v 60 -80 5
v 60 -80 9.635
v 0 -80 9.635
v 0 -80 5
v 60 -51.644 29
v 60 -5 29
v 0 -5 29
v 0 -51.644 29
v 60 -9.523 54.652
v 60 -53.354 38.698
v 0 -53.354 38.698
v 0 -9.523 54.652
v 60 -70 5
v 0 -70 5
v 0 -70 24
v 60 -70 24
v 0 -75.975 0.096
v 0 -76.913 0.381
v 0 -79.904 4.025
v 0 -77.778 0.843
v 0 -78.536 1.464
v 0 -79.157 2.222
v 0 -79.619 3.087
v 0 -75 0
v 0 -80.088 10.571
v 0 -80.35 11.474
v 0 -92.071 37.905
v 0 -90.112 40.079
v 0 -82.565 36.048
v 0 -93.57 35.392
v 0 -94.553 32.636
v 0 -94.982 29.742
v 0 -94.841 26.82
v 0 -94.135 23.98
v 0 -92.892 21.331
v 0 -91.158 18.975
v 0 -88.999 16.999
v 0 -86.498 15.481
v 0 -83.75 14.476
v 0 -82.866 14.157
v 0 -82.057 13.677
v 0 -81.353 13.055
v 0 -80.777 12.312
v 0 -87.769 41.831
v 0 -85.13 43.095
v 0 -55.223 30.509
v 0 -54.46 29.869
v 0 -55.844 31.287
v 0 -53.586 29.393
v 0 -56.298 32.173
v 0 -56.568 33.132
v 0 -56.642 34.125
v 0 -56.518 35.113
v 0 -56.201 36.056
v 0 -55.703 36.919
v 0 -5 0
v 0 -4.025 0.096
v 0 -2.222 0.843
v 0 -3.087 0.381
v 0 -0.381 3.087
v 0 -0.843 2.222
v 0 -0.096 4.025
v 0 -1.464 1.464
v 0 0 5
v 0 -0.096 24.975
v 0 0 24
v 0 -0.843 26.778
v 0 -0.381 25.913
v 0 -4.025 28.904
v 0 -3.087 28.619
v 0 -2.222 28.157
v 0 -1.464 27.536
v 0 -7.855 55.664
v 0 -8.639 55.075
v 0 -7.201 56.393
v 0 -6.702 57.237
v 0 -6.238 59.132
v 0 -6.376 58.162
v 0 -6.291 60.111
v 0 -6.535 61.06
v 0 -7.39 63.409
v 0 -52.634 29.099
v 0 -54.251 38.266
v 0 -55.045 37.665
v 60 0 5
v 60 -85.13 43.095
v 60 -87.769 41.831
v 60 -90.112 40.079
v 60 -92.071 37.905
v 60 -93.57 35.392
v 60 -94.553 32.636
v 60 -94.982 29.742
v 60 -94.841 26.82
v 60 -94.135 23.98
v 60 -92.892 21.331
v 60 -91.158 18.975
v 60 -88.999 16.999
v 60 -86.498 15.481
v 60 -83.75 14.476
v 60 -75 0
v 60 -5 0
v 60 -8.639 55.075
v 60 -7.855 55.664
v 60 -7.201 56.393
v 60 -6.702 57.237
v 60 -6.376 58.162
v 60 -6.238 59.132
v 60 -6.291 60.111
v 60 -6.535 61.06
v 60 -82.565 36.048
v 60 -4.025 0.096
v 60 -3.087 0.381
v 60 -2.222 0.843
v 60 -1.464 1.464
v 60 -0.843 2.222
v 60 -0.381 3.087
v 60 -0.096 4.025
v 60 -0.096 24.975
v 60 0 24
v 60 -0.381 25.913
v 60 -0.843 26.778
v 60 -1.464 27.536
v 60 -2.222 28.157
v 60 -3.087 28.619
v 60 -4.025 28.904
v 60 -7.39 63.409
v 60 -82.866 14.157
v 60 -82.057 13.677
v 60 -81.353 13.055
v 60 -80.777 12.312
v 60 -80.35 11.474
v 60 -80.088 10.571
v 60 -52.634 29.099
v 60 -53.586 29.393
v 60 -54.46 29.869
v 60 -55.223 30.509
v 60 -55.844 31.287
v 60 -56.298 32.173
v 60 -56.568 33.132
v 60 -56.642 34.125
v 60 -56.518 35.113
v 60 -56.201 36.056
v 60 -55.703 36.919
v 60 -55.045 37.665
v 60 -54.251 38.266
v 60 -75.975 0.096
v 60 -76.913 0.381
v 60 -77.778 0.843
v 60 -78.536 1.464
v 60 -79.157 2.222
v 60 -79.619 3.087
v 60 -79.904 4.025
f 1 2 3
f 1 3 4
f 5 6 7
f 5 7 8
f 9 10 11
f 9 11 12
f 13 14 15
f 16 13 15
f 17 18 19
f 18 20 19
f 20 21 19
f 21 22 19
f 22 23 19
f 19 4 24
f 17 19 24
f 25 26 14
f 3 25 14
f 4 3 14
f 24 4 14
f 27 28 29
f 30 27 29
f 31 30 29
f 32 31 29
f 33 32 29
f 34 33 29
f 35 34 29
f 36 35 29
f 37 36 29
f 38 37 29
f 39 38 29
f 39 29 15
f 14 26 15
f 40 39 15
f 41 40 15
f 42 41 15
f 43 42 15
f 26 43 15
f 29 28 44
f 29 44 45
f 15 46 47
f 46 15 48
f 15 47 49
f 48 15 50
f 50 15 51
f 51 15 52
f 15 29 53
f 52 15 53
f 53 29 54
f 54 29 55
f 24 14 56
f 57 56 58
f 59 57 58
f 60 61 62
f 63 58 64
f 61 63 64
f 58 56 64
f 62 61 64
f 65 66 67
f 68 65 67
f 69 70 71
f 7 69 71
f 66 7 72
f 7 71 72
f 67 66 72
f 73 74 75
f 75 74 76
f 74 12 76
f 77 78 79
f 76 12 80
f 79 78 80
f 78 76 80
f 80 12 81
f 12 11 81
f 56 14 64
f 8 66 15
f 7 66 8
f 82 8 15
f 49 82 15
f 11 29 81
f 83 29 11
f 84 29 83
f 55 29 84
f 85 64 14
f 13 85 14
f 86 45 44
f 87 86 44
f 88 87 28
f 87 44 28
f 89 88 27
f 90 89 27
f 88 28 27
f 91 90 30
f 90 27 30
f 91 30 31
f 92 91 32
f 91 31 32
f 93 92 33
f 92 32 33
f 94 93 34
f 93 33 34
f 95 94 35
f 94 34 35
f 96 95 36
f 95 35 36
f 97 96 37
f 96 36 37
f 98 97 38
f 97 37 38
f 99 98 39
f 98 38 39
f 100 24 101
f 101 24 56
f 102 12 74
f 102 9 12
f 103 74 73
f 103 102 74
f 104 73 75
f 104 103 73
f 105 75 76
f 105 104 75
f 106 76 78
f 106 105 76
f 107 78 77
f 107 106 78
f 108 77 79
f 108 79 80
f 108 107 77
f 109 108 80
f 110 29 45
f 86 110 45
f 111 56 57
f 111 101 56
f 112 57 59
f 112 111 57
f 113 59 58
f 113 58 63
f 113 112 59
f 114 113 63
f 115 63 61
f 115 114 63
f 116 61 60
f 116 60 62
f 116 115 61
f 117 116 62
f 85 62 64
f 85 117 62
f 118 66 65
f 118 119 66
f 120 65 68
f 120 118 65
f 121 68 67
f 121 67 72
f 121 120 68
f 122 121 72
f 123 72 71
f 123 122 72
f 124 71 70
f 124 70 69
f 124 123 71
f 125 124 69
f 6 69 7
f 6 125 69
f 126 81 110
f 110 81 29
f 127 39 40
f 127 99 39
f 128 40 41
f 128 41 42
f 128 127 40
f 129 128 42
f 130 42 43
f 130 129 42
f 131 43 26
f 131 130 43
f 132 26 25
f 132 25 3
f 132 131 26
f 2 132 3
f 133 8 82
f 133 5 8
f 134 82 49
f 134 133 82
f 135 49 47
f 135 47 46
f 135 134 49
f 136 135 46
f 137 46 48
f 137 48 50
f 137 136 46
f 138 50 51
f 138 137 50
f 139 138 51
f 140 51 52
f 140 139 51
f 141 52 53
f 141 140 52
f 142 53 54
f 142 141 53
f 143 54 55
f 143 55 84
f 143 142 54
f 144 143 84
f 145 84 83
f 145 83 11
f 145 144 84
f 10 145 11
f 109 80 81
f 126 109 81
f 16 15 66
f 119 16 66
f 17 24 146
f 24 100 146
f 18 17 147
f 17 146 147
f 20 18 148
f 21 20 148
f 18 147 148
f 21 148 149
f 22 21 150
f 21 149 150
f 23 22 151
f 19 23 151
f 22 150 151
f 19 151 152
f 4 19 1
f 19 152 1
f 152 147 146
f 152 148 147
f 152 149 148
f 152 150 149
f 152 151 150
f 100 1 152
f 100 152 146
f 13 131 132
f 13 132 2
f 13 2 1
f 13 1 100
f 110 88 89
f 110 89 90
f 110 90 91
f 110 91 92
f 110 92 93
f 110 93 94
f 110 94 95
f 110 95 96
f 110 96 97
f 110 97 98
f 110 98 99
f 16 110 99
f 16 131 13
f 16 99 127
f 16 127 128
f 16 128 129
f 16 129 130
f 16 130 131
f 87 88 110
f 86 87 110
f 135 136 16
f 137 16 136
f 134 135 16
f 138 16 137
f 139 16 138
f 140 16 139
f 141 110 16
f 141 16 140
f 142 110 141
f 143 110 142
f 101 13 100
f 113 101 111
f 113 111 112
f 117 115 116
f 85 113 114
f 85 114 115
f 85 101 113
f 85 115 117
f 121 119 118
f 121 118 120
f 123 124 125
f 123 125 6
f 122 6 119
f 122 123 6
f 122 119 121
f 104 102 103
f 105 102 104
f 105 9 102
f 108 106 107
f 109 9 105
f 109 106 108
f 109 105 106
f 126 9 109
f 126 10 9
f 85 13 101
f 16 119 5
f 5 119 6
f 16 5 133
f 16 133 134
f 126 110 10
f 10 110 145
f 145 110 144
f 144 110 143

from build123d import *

# Parameters (mm, degrees)
F1_DEPTH = 60
F2_R     = 4.99999


# Not quite as in the source:
# - a fillet or chamfer is up to 0.001 mm smaller than in the source, because OpenCascade refuses the exact size


with BuildPart() as f1:
    # F0 (on Right) → F1 (new body)
    with BuildSketch(Plane.YZ):
        Polygon((-80, 0), (0, 0), (0, 5), (-70, 5), (-70, 24), (0, 24), (0, 29), (-80, 29), (-80, 14), align=None)
        with BuildLine():
            ThreePointArc((-85.1303021499, 43.0953893118), (-94.7721162952, 26.395277335), (-80, 14))
            Line((-80, 14), (-80, 29))
            Line((-80, 29), (-82.5651510749, 36.0476946559))
            Line((-82.5651510749, 36.0476946559), (-85.1303021499, 43.0953893118))
        make_face()
        Polygon((-82.5651510749, 36.0476946559), (-80, 29), (-4.8245903371, 56.3616114661), (-7.3897414121, 63.4093061219), align=None)
    extrude(amount=F1_DEPTH)

    # F2 (radius 5 in the source; OpenCascade refuses exactly that, so slightly less here)
    f2_edges = [f1.edges().sort_by_distance(p)[0] for p in [
        (30, -80, 29),
        (30, -80, 14),
        (30, -80, 0),
        (30, 0, 0),
        (30, 0, 29),
        (30, -4.82459, 56.361611),
    ]]
    fillet(f2_edges, radius=F2_R)


solid = f1.part
